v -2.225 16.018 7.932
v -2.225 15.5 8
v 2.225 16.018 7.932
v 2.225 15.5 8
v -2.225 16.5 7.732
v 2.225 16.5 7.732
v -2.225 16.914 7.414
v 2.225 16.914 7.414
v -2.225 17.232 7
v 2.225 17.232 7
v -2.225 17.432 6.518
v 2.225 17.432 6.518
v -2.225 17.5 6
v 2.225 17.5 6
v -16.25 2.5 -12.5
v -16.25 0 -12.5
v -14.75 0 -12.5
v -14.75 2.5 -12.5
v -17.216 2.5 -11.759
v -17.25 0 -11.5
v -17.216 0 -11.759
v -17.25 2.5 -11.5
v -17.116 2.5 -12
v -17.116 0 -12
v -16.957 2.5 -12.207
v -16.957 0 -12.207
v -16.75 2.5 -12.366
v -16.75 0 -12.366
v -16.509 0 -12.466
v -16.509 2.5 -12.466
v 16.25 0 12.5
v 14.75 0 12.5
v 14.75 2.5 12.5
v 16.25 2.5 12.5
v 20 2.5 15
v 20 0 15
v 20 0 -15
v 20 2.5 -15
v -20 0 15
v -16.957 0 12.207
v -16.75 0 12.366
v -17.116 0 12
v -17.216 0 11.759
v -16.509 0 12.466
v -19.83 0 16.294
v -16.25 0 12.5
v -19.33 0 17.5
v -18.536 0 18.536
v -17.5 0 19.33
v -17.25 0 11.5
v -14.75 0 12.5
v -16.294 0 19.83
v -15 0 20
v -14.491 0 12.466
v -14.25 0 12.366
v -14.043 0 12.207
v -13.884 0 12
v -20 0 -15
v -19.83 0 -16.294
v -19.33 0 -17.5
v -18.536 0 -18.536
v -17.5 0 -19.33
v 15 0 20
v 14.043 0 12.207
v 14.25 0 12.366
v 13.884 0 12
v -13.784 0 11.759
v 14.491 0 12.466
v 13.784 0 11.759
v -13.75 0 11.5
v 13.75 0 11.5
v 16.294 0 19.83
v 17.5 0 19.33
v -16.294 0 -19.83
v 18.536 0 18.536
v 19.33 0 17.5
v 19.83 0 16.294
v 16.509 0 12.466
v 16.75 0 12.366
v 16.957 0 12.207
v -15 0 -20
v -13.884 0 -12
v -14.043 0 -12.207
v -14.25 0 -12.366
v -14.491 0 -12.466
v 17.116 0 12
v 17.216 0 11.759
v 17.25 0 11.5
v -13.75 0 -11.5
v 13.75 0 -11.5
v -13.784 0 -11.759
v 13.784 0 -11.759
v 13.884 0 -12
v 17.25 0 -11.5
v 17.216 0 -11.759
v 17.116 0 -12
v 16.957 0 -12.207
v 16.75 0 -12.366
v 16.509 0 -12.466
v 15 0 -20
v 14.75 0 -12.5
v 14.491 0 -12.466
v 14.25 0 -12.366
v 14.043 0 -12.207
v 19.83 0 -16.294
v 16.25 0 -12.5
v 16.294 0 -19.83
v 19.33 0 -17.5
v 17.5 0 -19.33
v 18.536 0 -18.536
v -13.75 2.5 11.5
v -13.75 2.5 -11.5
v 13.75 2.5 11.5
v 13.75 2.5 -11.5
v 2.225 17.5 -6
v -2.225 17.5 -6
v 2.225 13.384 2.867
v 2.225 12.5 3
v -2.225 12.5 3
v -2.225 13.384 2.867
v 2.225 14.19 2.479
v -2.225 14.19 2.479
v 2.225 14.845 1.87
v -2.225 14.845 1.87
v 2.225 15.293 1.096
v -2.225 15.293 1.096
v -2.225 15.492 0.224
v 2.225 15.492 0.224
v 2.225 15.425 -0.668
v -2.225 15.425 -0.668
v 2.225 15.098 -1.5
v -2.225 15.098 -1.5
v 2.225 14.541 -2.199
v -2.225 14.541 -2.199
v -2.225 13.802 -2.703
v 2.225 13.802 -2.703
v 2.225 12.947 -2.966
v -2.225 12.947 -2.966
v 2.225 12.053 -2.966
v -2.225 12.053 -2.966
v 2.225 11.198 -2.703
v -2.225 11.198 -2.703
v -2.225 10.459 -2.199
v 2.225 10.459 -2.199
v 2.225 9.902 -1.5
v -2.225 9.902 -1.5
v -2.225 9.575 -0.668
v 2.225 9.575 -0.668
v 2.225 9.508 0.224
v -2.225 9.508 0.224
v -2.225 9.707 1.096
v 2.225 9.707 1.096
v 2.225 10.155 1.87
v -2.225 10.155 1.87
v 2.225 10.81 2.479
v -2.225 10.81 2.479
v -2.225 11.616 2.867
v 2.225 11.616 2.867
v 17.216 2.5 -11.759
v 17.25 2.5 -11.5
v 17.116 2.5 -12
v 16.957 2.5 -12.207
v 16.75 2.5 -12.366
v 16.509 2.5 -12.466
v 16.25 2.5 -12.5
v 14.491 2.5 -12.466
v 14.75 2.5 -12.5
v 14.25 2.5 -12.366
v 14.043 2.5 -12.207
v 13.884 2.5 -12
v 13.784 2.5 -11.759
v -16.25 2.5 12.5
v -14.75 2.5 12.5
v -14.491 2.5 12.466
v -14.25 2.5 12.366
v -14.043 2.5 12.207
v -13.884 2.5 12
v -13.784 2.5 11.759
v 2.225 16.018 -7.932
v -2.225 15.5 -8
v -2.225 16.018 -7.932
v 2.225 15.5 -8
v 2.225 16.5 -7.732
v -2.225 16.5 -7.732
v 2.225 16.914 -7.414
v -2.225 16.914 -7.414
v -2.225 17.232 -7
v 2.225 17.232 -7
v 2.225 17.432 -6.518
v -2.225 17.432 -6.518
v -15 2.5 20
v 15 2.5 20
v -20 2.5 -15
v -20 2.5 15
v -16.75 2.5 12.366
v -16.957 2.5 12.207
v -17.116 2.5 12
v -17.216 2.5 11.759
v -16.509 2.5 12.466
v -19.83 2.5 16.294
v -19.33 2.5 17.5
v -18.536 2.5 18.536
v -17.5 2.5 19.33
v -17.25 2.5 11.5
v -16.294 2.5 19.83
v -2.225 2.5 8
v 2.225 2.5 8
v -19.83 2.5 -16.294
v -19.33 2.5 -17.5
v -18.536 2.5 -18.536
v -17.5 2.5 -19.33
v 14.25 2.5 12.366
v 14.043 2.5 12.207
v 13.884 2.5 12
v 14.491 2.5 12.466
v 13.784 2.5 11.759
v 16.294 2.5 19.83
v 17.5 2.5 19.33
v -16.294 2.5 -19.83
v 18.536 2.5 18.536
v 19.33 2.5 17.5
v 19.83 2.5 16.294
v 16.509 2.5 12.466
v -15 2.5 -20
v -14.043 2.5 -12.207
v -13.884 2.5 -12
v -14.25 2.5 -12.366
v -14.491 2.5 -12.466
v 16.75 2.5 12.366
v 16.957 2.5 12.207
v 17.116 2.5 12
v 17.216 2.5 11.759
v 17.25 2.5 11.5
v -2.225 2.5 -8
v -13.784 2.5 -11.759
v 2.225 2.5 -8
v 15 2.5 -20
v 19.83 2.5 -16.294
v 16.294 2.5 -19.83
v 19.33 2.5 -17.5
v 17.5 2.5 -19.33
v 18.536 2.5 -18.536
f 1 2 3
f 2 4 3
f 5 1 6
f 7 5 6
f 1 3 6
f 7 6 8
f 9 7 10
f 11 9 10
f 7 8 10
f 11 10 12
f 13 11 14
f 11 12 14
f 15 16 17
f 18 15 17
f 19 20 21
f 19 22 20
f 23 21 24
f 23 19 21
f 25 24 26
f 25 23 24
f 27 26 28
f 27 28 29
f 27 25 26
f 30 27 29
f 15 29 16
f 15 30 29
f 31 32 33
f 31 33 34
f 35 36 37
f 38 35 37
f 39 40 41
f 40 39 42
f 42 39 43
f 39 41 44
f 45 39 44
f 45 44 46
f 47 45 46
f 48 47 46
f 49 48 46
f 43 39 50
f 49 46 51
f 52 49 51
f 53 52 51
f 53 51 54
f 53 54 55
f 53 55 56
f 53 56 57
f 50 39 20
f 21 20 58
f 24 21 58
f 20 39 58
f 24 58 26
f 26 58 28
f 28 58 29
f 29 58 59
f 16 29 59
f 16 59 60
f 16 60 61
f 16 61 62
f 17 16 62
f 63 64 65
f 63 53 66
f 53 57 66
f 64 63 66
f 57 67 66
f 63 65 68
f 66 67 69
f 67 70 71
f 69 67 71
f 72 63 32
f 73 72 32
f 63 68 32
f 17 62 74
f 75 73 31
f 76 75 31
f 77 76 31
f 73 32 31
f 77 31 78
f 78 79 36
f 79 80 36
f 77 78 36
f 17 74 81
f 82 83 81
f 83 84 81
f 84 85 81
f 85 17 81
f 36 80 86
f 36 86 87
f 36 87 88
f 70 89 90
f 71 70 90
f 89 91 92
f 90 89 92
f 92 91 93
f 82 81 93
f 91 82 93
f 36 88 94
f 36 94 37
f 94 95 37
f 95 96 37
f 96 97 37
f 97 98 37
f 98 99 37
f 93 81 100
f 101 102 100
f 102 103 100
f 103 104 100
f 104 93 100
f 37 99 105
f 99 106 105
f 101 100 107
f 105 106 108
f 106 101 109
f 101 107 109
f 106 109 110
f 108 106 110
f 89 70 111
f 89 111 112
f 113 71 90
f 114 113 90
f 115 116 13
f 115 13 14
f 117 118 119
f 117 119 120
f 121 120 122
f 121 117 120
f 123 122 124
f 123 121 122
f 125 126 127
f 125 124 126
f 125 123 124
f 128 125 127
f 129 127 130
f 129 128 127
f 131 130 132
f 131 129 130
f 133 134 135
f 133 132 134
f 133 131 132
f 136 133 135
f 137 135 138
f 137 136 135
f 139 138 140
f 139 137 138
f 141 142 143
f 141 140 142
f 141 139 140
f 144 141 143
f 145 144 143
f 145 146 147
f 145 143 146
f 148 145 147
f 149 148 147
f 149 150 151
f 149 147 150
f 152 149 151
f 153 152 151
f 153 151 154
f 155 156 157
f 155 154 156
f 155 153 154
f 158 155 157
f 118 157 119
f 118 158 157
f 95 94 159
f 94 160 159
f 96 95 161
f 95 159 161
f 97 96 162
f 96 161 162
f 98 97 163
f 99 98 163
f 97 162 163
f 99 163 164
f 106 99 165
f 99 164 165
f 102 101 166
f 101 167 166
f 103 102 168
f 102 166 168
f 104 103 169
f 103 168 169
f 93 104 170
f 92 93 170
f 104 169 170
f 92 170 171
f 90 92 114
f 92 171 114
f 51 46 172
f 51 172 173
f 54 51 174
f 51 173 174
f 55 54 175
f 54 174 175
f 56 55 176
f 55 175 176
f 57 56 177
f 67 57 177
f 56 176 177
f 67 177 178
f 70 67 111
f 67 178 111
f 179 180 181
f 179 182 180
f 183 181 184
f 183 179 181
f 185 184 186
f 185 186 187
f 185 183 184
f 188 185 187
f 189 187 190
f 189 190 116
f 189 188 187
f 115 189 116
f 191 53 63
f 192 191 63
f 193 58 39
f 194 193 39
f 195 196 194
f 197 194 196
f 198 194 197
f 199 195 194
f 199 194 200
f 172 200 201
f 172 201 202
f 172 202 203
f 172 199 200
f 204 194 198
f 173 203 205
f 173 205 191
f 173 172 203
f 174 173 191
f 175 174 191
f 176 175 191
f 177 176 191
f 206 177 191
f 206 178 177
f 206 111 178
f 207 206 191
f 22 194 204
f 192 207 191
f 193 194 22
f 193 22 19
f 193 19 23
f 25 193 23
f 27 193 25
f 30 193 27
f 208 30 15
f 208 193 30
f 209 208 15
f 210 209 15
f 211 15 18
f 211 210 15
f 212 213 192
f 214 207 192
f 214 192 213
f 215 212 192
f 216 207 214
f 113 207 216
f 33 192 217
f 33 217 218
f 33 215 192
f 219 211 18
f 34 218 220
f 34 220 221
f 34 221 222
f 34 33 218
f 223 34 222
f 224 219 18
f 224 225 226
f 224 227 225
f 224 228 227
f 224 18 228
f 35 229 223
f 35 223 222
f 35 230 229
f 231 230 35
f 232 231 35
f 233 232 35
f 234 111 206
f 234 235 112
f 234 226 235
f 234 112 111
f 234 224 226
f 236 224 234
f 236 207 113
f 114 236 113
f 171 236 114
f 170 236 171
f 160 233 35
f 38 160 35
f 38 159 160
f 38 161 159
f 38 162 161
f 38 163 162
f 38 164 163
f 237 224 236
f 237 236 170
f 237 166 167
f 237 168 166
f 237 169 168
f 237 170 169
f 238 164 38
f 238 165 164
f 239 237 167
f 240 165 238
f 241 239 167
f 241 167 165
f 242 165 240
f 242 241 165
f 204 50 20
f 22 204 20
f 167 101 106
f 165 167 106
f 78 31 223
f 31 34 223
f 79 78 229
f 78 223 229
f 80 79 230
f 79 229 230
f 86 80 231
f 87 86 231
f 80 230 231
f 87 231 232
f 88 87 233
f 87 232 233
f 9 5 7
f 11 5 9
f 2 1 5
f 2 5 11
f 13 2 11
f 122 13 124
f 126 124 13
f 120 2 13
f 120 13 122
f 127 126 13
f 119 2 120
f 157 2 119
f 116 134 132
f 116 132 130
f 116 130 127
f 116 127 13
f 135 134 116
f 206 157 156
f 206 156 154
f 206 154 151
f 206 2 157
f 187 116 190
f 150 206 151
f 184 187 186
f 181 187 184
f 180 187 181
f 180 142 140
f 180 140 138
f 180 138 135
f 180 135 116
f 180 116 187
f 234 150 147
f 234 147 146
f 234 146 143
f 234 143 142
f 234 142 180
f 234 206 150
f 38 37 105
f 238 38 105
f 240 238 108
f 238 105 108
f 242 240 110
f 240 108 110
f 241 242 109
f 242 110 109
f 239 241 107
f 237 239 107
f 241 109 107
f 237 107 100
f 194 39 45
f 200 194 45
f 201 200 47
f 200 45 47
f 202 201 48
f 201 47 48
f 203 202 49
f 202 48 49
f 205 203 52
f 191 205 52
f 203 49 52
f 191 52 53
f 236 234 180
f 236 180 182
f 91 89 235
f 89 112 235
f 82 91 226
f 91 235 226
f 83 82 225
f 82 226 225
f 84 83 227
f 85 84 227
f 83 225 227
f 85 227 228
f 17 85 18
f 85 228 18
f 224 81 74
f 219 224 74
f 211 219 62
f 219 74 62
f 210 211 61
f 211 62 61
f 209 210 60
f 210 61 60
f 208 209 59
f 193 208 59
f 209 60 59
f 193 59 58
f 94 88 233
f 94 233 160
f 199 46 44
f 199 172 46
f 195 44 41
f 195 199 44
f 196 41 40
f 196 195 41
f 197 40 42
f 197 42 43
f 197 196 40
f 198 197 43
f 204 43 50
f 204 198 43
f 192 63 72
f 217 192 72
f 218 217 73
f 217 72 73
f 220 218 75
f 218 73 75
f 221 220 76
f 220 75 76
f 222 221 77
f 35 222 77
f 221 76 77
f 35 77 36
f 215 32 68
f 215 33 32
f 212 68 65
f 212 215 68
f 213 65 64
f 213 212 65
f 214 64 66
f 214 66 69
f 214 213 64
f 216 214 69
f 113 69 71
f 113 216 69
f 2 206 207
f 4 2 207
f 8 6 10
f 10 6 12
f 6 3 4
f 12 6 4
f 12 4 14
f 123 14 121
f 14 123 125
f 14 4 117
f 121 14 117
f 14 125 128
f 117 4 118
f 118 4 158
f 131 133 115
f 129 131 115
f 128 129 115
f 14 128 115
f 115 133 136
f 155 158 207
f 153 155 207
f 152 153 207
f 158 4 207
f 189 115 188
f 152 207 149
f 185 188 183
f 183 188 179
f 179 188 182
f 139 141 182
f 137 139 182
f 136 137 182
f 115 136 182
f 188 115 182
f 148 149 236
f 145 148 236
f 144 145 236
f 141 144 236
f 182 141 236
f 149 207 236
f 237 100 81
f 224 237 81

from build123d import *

# Parameters (mm, degrees)
SKETCH1_W               = 3.5
SKETCH1_H               = 25
BOSS_EXTRUDE1_DEPTH     = 2.5
FILLET1_R               = 1
FILLET2_R               = 1
SKETCH2_W               = 4.45
SKETCH2_H               = 16
BOSS_EXTRUDE2_DEPTH     = 15
CUT_EXTRUDE1_DEPTH      = 35.643911803
CUT_EXTRUDE1_DEPTH_BACK = 35.643911803
SKETCH3_R               = 3
FILLET3_R               = 2


with BuildPart() as part:
    # Sketch1 → Boss-Extrude1 (new body)
    with BuildSketch(Plane(origin=(0, 0, 0), x_dir=(1, 0, 0), z_dir=(0, 1, 0))):
        with BuildLine():
            Line((15, 20), (-15, 20))
            ThreePointArc((-15, 20), (-18.535533906, 18.535533906), (-20, 15))
            Line((-20, 15), (-20, -15))
            ThreePointArc((-20, -15), (-18.535533906, -18.535533906), (-15, -20))
            Line((-15, -20), (15, -20))
            ThreePointArc((15, -20), (18.535533906, -18.535533906), (20, -15))
            Line((20, -15), (20, 15))
            ThreePointArc((20, 15), (18.535533906, 18.535533906), (15, 20))
        make_face()
        with Locations((-15.5, 0)):
            Rectangle(SKETCH1_W, SKETCH1_H, mode=Mode.SUBTRACT)
        with Locations((15.5, 0)):
            Rectangle(SKETCH1_W, SKETCH1_H, mode=Mode.SUBTRACT)
    extrude(amount=BOSS_EXTRUDE1_DEPTH)

    # Fillet1
    fillet1_edges = [part.edges().sort_by_distance(p)[0] for p in [
        (-17.25, 1.25, -12.5),
        (-17.25, 1.25, 12.5),
        (-13.75, 1.25, 12.5),
        (-13.75, 1.25, -12.5),
    ]]
    fillet(fillet1_edges, radius=FILLET1_R)

    # Fillet2
    fillet2_edges = [part.edges().sort_by_distance(p)[0] for p in [
        (13.75, 1.25, -12.5),
        (13.75, 1.25, 12.5),
        (17.25, 1.25, 12.5),
        (17.25, 1.25, -12.5),
    ]]
    fillet(fillet2_edges, radius=FILLET2_R)

    # Sketch2 → Boss-Extrude2 (add)
    with BuildSketch(Plane(origin=(0, 2.5, 0), x_dir=(1, 0, 0), z_dir=(0, 1, 0))):
        Rectangle(SKETCH2_W, SKETCH2_H)
    extrude(amount=BOSS_EXTRUDE2_DEPTH)

    # Sketch3 → Cut-Extrude1 (cut, two sides: drawn at the far end of the back side and taken through both)
    with BuildSketch(Plane.ZY.offset(2.225).offset(-CUT_EXTRUDE1_DEPTH_BACK)):
        with Locations((0, 12.5)):
            Circle(SKETCH3_R)
    extrude(amount=CUT_EXTRUDE1_DEPTH + CUT_EXTRUDE1_DEPTH_BACK, mode=Mode.SUBTRACT)

    # Fillet3
    fillet3_edges = [part.edges().sort_by_distance(p)[0] for p in [
        (0, 17.5, 8),
        (0, 17.5, -8),
    ]]
    fillet(fillet3_edges, radius=FILLET3_R)


solid = part.part
